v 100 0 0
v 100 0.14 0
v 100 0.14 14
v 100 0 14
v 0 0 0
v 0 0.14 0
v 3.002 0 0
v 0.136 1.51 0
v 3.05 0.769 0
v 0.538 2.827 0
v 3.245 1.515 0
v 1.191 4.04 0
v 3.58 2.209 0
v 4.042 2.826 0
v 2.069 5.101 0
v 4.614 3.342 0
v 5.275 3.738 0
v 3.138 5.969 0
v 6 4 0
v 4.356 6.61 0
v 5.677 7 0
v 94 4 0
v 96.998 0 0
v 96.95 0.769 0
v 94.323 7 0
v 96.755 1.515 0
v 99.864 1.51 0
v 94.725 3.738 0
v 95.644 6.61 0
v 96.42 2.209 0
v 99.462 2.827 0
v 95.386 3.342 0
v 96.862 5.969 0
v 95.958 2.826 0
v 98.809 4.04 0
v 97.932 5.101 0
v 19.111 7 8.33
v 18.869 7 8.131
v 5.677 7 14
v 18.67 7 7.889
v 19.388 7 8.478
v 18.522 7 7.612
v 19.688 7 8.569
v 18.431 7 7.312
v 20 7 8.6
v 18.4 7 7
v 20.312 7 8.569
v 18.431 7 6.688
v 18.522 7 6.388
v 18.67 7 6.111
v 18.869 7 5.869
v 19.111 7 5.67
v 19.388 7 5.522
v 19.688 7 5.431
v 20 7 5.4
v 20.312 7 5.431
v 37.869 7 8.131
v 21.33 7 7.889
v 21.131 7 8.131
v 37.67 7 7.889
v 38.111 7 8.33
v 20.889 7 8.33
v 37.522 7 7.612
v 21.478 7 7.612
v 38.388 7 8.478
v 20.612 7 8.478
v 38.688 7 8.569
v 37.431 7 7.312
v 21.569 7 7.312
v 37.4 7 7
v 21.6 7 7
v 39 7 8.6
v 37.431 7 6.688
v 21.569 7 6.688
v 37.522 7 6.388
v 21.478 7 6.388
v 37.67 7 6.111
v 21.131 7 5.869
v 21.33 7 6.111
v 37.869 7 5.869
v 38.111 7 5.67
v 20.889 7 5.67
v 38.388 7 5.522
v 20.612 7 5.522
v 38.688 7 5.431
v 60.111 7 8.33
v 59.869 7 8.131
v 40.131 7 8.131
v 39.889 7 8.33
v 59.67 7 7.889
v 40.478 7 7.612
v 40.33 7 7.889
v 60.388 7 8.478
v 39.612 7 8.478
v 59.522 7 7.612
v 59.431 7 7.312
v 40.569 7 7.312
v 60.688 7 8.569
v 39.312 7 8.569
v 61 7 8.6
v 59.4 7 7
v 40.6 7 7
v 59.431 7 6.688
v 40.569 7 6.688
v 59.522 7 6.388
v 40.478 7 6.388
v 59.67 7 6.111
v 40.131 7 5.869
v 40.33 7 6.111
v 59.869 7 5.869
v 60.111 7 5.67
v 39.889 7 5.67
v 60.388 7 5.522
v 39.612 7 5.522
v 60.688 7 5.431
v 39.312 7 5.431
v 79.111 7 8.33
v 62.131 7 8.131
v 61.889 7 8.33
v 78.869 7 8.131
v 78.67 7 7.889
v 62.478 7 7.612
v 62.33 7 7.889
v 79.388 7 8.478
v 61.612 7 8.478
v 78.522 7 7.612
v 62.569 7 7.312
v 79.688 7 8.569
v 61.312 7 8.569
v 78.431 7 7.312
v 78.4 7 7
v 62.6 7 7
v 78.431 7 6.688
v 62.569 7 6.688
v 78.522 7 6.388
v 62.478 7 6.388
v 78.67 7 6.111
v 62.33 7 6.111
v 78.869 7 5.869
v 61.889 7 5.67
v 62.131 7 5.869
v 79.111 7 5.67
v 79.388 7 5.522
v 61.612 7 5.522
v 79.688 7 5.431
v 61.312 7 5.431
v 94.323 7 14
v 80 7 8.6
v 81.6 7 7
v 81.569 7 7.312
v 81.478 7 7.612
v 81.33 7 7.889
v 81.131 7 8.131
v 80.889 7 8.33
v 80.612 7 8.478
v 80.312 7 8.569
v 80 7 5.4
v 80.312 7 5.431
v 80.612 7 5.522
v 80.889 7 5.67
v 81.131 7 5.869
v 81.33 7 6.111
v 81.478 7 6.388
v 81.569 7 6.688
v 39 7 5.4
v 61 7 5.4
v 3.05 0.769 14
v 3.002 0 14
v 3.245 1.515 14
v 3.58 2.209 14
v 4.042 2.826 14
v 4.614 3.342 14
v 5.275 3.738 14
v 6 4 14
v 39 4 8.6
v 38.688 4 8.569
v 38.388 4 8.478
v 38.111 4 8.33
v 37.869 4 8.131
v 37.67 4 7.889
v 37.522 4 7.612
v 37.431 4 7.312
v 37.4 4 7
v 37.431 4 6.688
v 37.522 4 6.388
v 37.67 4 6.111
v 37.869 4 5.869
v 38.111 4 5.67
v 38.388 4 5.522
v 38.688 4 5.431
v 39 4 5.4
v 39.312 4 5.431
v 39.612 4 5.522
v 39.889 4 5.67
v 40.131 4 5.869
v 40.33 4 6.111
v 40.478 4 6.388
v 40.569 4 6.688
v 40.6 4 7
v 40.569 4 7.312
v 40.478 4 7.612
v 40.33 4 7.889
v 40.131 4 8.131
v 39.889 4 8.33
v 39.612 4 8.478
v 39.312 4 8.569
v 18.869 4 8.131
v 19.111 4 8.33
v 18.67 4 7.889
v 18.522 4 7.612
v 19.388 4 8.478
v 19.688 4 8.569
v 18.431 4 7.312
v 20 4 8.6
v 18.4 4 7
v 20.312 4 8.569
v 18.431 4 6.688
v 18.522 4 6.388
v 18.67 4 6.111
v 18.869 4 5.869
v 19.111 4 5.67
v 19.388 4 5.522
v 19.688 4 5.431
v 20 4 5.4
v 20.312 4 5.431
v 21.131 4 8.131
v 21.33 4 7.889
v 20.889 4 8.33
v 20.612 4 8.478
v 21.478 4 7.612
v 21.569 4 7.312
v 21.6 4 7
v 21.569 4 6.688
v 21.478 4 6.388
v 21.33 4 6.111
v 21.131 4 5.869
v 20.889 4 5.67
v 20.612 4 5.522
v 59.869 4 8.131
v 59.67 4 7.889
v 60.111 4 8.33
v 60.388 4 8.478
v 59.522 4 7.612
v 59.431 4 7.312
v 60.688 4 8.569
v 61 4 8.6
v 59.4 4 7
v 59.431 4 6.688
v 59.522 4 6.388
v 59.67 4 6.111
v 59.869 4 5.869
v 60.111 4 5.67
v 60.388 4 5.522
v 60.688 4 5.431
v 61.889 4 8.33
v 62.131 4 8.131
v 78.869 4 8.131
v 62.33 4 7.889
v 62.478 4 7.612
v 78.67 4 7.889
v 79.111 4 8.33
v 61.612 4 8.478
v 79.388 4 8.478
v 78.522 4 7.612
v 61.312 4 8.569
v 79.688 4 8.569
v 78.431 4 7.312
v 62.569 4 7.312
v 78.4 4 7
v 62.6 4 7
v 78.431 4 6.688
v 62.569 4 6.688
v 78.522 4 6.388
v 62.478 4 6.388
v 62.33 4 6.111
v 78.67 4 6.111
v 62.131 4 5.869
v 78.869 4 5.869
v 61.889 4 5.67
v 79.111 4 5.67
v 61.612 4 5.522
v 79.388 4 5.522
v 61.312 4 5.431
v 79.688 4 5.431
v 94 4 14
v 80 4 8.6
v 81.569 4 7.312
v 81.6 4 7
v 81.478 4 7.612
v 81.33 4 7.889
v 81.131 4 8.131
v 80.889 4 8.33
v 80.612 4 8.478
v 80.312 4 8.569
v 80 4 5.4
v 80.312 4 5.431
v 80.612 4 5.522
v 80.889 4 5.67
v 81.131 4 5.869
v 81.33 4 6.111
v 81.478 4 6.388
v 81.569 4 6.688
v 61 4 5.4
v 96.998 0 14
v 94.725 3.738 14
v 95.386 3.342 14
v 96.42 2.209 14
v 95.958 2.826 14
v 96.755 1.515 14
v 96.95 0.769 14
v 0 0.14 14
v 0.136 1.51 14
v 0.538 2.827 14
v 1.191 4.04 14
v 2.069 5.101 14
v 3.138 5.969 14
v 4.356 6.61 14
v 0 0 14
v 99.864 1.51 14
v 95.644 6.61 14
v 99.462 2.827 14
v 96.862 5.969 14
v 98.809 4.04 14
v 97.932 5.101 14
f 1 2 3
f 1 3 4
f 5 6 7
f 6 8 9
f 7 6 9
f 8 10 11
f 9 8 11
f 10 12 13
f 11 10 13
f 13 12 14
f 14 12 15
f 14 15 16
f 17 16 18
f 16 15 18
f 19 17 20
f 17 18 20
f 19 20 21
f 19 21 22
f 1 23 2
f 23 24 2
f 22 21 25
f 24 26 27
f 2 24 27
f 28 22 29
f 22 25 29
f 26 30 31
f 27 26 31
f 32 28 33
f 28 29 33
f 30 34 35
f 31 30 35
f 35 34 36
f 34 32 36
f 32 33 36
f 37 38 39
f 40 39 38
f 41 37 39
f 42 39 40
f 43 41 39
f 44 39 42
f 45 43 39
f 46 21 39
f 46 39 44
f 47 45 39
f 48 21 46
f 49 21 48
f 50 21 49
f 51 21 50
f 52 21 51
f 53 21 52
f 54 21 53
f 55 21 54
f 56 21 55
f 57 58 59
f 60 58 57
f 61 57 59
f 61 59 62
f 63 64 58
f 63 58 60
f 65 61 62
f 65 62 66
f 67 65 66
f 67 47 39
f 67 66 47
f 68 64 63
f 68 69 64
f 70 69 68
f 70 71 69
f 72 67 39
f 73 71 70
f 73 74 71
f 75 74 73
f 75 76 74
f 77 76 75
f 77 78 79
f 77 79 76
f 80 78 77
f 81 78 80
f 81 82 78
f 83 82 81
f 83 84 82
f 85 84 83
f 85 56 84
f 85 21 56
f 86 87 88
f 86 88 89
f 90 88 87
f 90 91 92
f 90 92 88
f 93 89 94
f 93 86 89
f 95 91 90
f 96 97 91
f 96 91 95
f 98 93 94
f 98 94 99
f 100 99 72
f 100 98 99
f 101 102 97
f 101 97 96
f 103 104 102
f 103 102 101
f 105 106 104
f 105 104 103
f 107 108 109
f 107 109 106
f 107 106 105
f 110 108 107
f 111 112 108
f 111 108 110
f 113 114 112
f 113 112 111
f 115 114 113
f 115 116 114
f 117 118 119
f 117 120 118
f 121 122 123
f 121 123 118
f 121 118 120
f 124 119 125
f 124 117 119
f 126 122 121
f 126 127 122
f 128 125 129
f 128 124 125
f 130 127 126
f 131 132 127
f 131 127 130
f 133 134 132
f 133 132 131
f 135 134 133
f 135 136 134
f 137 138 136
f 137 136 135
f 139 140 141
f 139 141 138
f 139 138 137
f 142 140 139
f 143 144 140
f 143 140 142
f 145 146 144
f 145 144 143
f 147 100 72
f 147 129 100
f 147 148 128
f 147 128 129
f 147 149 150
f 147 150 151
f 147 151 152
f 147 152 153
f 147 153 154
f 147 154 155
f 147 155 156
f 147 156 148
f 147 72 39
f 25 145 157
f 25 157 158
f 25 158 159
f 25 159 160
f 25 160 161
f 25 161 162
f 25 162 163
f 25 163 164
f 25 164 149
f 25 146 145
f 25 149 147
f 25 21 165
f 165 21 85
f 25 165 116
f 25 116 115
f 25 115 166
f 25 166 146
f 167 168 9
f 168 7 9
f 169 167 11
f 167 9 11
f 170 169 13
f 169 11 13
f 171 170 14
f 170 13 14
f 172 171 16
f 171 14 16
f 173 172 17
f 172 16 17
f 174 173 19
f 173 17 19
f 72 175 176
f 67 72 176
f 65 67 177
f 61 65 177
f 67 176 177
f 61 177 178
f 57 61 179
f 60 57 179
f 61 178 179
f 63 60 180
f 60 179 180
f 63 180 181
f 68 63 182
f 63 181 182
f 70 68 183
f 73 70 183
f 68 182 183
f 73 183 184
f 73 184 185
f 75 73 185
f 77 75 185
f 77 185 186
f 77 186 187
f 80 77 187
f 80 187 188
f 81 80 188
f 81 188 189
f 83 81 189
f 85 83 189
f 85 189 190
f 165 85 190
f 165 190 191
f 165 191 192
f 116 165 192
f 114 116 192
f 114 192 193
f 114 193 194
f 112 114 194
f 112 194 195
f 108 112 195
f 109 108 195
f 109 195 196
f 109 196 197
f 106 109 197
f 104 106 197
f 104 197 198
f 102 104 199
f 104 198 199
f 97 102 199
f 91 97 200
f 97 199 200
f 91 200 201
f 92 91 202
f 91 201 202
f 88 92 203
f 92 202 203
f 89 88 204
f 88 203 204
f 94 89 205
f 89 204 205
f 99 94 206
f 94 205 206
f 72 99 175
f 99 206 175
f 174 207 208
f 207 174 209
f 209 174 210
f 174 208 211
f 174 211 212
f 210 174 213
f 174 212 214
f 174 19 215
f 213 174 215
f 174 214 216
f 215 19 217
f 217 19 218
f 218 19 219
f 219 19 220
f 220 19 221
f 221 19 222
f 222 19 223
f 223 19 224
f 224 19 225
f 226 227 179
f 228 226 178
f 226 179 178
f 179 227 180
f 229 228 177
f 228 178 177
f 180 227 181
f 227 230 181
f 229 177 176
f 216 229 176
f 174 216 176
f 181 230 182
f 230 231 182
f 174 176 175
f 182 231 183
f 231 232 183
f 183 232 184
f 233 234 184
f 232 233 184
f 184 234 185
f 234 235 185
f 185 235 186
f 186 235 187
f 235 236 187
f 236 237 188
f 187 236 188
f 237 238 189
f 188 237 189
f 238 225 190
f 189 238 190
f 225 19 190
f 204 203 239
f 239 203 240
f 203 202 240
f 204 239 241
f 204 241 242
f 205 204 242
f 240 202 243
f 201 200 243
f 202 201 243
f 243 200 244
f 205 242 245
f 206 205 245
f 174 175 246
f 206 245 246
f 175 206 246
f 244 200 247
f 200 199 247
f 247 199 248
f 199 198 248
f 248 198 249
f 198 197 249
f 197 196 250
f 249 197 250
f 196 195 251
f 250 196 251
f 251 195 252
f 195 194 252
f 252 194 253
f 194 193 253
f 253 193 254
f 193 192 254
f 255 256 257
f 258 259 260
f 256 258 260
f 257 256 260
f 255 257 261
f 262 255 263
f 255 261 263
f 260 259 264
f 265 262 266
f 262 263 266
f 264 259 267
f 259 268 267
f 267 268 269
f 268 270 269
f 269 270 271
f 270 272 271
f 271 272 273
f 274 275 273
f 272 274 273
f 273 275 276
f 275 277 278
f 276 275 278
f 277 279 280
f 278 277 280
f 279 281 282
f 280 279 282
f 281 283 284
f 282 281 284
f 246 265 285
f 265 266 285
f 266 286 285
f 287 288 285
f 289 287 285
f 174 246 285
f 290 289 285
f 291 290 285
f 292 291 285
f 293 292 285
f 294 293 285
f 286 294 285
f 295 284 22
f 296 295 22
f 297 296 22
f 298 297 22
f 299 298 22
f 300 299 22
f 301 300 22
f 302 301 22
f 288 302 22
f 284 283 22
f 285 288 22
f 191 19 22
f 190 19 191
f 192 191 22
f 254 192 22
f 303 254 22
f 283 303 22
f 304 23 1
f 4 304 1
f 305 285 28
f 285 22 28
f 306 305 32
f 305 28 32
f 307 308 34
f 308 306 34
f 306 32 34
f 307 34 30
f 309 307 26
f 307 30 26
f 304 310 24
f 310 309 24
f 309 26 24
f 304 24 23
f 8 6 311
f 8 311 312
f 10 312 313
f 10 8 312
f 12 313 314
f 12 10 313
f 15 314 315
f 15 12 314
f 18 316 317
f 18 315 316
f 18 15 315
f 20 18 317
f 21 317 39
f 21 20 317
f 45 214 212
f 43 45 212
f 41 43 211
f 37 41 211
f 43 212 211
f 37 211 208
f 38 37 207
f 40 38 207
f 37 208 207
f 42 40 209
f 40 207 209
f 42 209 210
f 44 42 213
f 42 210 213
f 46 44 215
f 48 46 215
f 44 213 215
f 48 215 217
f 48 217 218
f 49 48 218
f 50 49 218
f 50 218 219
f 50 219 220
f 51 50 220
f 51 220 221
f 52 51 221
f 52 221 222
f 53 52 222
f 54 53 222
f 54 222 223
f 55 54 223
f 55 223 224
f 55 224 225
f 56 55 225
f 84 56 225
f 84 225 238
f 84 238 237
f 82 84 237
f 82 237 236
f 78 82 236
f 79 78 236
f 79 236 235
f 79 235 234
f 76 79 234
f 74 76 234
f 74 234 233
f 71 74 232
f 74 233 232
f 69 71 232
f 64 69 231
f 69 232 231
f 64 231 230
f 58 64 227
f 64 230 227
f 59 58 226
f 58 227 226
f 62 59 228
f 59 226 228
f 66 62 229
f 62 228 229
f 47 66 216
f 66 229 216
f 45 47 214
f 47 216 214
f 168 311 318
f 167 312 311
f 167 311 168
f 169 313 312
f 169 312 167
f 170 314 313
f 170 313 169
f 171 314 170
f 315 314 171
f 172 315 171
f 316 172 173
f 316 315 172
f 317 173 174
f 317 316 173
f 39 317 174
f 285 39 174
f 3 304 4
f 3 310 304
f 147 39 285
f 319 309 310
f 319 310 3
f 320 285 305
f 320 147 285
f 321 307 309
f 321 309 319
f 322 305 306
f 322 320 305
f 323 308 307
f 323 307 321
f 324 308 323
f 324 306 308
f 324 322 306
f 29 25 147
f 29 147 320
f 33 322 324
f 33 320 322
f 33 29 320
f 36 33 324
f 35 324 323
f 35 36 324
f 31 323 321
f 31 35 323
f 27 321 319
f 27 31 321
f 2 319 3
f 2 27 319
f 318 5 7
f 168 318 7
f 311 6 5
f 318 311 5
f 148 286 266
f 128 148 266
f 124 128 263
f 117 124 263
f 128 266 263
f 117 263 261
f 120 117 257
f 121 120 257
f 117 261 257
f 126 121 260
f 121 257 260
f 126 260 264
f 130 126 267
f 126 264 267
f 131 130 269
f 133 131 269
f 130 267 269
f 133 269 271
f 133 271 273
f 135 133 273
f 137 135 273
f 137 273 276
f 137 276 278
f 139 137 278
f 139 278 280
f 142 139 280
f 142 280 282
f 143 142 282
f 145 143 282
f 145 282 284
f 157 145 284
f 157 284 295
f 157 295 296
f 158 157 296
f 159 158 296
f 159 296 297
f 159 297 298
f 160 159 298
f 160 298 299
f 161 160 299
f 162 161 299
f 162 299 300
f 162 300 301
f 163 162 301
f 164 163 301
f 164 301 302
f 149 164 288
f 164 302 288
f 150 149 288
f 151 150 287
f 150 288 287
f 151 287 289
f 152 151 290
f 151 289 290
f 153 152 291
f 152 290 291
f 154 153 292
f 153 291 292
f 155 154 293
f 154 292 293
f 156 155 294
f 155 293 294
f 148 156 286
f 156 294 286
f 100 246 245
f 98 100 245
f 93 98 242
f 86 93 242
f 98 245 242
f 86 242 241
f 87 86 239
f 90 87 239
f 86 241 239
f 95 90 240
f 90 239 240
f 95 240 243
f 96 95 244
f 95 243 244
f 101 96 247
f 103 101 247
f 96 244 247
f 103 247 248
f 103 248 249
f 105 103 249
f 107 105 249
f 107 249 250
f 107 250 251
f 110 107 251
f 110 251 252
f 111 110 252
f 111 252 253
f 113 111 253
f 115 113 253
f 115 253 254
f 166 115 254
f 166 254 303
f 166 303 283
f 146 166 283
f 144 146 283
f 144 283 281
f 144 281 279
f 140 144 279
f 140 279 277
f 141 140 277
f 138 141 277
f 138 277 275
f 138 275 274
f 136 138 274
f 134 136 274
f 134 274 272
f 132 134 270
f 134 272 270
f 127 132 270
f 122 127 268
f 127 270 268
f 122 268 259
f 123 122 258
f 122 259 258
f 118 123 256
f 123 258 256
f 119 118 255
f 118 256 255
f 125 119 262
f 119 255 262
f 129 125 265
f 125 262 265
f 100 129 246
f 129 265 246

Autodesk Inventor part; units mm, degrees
ref_plane "YZ Plane" through (0, 0, 0) normal (1, 0, 0) x (0, 1, 0)
ref_plane "XZ Plane" through (0, 0, 0) normal (0, 1, 0) x (-1, 0, 0)
ref_plane "XY Plane" through (0, 0, 0) normal (0, 0, 1) x (1, 0, 0)
sketch "Sketch1" plane through (0, 0, 0) normal (0, 0, 1) x (1, 0, 0)
  line L0 (100, 0.14) -> (100, 0)
  line L1 (0, 0.14) -> (0, 0)
  arc A0 (96.9975, 0) -> (94, 4) centre (93.0167, 0.14) ccw
  arc A1 (100, 0.14) -> (94.323, 7) centre (93.0167, 0.14) ccw
  arc A2 (6, 4) -> (3.0025, 0) centre (6.9833, 0.14) ccw
  arc A3 (5.677, 7) -> (0, 0.14) centre (6.9833, 0.14) ccw
  line L2 (5.677, 7) -> (94.323, 7)
  line L3 (96.9975, 0) -> (100, 0)
  line L4 (6, 4) -> (94, 4)
  line L5 (3, 0.14) -> (3, 0)
  line L6 (0, 0) -> (3.0025, 0)
  dimension "d0" = 100
  dimension "d6" = 3
  dimension "d7" = 7
  dimension "d8" = 3
extrude "Extrusion1" add sketch "Sketch1" along normal blind 14
sketch "Sketch2" plane through (5.677, 7, 0) normal (0, 1, 0) x (1, 0, 0)
  line L0 (0, -14) -> (88.6461, -14) projected
  line L1 (0, 0) -> (88.6461, 0) projected
  line L2 (44.323, 0) -> (44.323, -14)
  point P0 (-5.677, 0)
  point P1 (14.323, -7)
  point P2 (33.323, -7)
  point P3 (55.323, -7)
  point P4 (74.323, -7)
  dimension "d11" = 22
  dimension "d12" = 60
  dimension "d13" = 11
  dimension "d14" = 30
  dimension "d15" = 7
hole "Hole1" at (20, 7, 7) at (39, 7, 7) at (61, 7, 7) at (80, 7, 7) direction (0, -1, 0) diameter 3.2 depth 3 tip angle 118
properties part number "LAMINA"
